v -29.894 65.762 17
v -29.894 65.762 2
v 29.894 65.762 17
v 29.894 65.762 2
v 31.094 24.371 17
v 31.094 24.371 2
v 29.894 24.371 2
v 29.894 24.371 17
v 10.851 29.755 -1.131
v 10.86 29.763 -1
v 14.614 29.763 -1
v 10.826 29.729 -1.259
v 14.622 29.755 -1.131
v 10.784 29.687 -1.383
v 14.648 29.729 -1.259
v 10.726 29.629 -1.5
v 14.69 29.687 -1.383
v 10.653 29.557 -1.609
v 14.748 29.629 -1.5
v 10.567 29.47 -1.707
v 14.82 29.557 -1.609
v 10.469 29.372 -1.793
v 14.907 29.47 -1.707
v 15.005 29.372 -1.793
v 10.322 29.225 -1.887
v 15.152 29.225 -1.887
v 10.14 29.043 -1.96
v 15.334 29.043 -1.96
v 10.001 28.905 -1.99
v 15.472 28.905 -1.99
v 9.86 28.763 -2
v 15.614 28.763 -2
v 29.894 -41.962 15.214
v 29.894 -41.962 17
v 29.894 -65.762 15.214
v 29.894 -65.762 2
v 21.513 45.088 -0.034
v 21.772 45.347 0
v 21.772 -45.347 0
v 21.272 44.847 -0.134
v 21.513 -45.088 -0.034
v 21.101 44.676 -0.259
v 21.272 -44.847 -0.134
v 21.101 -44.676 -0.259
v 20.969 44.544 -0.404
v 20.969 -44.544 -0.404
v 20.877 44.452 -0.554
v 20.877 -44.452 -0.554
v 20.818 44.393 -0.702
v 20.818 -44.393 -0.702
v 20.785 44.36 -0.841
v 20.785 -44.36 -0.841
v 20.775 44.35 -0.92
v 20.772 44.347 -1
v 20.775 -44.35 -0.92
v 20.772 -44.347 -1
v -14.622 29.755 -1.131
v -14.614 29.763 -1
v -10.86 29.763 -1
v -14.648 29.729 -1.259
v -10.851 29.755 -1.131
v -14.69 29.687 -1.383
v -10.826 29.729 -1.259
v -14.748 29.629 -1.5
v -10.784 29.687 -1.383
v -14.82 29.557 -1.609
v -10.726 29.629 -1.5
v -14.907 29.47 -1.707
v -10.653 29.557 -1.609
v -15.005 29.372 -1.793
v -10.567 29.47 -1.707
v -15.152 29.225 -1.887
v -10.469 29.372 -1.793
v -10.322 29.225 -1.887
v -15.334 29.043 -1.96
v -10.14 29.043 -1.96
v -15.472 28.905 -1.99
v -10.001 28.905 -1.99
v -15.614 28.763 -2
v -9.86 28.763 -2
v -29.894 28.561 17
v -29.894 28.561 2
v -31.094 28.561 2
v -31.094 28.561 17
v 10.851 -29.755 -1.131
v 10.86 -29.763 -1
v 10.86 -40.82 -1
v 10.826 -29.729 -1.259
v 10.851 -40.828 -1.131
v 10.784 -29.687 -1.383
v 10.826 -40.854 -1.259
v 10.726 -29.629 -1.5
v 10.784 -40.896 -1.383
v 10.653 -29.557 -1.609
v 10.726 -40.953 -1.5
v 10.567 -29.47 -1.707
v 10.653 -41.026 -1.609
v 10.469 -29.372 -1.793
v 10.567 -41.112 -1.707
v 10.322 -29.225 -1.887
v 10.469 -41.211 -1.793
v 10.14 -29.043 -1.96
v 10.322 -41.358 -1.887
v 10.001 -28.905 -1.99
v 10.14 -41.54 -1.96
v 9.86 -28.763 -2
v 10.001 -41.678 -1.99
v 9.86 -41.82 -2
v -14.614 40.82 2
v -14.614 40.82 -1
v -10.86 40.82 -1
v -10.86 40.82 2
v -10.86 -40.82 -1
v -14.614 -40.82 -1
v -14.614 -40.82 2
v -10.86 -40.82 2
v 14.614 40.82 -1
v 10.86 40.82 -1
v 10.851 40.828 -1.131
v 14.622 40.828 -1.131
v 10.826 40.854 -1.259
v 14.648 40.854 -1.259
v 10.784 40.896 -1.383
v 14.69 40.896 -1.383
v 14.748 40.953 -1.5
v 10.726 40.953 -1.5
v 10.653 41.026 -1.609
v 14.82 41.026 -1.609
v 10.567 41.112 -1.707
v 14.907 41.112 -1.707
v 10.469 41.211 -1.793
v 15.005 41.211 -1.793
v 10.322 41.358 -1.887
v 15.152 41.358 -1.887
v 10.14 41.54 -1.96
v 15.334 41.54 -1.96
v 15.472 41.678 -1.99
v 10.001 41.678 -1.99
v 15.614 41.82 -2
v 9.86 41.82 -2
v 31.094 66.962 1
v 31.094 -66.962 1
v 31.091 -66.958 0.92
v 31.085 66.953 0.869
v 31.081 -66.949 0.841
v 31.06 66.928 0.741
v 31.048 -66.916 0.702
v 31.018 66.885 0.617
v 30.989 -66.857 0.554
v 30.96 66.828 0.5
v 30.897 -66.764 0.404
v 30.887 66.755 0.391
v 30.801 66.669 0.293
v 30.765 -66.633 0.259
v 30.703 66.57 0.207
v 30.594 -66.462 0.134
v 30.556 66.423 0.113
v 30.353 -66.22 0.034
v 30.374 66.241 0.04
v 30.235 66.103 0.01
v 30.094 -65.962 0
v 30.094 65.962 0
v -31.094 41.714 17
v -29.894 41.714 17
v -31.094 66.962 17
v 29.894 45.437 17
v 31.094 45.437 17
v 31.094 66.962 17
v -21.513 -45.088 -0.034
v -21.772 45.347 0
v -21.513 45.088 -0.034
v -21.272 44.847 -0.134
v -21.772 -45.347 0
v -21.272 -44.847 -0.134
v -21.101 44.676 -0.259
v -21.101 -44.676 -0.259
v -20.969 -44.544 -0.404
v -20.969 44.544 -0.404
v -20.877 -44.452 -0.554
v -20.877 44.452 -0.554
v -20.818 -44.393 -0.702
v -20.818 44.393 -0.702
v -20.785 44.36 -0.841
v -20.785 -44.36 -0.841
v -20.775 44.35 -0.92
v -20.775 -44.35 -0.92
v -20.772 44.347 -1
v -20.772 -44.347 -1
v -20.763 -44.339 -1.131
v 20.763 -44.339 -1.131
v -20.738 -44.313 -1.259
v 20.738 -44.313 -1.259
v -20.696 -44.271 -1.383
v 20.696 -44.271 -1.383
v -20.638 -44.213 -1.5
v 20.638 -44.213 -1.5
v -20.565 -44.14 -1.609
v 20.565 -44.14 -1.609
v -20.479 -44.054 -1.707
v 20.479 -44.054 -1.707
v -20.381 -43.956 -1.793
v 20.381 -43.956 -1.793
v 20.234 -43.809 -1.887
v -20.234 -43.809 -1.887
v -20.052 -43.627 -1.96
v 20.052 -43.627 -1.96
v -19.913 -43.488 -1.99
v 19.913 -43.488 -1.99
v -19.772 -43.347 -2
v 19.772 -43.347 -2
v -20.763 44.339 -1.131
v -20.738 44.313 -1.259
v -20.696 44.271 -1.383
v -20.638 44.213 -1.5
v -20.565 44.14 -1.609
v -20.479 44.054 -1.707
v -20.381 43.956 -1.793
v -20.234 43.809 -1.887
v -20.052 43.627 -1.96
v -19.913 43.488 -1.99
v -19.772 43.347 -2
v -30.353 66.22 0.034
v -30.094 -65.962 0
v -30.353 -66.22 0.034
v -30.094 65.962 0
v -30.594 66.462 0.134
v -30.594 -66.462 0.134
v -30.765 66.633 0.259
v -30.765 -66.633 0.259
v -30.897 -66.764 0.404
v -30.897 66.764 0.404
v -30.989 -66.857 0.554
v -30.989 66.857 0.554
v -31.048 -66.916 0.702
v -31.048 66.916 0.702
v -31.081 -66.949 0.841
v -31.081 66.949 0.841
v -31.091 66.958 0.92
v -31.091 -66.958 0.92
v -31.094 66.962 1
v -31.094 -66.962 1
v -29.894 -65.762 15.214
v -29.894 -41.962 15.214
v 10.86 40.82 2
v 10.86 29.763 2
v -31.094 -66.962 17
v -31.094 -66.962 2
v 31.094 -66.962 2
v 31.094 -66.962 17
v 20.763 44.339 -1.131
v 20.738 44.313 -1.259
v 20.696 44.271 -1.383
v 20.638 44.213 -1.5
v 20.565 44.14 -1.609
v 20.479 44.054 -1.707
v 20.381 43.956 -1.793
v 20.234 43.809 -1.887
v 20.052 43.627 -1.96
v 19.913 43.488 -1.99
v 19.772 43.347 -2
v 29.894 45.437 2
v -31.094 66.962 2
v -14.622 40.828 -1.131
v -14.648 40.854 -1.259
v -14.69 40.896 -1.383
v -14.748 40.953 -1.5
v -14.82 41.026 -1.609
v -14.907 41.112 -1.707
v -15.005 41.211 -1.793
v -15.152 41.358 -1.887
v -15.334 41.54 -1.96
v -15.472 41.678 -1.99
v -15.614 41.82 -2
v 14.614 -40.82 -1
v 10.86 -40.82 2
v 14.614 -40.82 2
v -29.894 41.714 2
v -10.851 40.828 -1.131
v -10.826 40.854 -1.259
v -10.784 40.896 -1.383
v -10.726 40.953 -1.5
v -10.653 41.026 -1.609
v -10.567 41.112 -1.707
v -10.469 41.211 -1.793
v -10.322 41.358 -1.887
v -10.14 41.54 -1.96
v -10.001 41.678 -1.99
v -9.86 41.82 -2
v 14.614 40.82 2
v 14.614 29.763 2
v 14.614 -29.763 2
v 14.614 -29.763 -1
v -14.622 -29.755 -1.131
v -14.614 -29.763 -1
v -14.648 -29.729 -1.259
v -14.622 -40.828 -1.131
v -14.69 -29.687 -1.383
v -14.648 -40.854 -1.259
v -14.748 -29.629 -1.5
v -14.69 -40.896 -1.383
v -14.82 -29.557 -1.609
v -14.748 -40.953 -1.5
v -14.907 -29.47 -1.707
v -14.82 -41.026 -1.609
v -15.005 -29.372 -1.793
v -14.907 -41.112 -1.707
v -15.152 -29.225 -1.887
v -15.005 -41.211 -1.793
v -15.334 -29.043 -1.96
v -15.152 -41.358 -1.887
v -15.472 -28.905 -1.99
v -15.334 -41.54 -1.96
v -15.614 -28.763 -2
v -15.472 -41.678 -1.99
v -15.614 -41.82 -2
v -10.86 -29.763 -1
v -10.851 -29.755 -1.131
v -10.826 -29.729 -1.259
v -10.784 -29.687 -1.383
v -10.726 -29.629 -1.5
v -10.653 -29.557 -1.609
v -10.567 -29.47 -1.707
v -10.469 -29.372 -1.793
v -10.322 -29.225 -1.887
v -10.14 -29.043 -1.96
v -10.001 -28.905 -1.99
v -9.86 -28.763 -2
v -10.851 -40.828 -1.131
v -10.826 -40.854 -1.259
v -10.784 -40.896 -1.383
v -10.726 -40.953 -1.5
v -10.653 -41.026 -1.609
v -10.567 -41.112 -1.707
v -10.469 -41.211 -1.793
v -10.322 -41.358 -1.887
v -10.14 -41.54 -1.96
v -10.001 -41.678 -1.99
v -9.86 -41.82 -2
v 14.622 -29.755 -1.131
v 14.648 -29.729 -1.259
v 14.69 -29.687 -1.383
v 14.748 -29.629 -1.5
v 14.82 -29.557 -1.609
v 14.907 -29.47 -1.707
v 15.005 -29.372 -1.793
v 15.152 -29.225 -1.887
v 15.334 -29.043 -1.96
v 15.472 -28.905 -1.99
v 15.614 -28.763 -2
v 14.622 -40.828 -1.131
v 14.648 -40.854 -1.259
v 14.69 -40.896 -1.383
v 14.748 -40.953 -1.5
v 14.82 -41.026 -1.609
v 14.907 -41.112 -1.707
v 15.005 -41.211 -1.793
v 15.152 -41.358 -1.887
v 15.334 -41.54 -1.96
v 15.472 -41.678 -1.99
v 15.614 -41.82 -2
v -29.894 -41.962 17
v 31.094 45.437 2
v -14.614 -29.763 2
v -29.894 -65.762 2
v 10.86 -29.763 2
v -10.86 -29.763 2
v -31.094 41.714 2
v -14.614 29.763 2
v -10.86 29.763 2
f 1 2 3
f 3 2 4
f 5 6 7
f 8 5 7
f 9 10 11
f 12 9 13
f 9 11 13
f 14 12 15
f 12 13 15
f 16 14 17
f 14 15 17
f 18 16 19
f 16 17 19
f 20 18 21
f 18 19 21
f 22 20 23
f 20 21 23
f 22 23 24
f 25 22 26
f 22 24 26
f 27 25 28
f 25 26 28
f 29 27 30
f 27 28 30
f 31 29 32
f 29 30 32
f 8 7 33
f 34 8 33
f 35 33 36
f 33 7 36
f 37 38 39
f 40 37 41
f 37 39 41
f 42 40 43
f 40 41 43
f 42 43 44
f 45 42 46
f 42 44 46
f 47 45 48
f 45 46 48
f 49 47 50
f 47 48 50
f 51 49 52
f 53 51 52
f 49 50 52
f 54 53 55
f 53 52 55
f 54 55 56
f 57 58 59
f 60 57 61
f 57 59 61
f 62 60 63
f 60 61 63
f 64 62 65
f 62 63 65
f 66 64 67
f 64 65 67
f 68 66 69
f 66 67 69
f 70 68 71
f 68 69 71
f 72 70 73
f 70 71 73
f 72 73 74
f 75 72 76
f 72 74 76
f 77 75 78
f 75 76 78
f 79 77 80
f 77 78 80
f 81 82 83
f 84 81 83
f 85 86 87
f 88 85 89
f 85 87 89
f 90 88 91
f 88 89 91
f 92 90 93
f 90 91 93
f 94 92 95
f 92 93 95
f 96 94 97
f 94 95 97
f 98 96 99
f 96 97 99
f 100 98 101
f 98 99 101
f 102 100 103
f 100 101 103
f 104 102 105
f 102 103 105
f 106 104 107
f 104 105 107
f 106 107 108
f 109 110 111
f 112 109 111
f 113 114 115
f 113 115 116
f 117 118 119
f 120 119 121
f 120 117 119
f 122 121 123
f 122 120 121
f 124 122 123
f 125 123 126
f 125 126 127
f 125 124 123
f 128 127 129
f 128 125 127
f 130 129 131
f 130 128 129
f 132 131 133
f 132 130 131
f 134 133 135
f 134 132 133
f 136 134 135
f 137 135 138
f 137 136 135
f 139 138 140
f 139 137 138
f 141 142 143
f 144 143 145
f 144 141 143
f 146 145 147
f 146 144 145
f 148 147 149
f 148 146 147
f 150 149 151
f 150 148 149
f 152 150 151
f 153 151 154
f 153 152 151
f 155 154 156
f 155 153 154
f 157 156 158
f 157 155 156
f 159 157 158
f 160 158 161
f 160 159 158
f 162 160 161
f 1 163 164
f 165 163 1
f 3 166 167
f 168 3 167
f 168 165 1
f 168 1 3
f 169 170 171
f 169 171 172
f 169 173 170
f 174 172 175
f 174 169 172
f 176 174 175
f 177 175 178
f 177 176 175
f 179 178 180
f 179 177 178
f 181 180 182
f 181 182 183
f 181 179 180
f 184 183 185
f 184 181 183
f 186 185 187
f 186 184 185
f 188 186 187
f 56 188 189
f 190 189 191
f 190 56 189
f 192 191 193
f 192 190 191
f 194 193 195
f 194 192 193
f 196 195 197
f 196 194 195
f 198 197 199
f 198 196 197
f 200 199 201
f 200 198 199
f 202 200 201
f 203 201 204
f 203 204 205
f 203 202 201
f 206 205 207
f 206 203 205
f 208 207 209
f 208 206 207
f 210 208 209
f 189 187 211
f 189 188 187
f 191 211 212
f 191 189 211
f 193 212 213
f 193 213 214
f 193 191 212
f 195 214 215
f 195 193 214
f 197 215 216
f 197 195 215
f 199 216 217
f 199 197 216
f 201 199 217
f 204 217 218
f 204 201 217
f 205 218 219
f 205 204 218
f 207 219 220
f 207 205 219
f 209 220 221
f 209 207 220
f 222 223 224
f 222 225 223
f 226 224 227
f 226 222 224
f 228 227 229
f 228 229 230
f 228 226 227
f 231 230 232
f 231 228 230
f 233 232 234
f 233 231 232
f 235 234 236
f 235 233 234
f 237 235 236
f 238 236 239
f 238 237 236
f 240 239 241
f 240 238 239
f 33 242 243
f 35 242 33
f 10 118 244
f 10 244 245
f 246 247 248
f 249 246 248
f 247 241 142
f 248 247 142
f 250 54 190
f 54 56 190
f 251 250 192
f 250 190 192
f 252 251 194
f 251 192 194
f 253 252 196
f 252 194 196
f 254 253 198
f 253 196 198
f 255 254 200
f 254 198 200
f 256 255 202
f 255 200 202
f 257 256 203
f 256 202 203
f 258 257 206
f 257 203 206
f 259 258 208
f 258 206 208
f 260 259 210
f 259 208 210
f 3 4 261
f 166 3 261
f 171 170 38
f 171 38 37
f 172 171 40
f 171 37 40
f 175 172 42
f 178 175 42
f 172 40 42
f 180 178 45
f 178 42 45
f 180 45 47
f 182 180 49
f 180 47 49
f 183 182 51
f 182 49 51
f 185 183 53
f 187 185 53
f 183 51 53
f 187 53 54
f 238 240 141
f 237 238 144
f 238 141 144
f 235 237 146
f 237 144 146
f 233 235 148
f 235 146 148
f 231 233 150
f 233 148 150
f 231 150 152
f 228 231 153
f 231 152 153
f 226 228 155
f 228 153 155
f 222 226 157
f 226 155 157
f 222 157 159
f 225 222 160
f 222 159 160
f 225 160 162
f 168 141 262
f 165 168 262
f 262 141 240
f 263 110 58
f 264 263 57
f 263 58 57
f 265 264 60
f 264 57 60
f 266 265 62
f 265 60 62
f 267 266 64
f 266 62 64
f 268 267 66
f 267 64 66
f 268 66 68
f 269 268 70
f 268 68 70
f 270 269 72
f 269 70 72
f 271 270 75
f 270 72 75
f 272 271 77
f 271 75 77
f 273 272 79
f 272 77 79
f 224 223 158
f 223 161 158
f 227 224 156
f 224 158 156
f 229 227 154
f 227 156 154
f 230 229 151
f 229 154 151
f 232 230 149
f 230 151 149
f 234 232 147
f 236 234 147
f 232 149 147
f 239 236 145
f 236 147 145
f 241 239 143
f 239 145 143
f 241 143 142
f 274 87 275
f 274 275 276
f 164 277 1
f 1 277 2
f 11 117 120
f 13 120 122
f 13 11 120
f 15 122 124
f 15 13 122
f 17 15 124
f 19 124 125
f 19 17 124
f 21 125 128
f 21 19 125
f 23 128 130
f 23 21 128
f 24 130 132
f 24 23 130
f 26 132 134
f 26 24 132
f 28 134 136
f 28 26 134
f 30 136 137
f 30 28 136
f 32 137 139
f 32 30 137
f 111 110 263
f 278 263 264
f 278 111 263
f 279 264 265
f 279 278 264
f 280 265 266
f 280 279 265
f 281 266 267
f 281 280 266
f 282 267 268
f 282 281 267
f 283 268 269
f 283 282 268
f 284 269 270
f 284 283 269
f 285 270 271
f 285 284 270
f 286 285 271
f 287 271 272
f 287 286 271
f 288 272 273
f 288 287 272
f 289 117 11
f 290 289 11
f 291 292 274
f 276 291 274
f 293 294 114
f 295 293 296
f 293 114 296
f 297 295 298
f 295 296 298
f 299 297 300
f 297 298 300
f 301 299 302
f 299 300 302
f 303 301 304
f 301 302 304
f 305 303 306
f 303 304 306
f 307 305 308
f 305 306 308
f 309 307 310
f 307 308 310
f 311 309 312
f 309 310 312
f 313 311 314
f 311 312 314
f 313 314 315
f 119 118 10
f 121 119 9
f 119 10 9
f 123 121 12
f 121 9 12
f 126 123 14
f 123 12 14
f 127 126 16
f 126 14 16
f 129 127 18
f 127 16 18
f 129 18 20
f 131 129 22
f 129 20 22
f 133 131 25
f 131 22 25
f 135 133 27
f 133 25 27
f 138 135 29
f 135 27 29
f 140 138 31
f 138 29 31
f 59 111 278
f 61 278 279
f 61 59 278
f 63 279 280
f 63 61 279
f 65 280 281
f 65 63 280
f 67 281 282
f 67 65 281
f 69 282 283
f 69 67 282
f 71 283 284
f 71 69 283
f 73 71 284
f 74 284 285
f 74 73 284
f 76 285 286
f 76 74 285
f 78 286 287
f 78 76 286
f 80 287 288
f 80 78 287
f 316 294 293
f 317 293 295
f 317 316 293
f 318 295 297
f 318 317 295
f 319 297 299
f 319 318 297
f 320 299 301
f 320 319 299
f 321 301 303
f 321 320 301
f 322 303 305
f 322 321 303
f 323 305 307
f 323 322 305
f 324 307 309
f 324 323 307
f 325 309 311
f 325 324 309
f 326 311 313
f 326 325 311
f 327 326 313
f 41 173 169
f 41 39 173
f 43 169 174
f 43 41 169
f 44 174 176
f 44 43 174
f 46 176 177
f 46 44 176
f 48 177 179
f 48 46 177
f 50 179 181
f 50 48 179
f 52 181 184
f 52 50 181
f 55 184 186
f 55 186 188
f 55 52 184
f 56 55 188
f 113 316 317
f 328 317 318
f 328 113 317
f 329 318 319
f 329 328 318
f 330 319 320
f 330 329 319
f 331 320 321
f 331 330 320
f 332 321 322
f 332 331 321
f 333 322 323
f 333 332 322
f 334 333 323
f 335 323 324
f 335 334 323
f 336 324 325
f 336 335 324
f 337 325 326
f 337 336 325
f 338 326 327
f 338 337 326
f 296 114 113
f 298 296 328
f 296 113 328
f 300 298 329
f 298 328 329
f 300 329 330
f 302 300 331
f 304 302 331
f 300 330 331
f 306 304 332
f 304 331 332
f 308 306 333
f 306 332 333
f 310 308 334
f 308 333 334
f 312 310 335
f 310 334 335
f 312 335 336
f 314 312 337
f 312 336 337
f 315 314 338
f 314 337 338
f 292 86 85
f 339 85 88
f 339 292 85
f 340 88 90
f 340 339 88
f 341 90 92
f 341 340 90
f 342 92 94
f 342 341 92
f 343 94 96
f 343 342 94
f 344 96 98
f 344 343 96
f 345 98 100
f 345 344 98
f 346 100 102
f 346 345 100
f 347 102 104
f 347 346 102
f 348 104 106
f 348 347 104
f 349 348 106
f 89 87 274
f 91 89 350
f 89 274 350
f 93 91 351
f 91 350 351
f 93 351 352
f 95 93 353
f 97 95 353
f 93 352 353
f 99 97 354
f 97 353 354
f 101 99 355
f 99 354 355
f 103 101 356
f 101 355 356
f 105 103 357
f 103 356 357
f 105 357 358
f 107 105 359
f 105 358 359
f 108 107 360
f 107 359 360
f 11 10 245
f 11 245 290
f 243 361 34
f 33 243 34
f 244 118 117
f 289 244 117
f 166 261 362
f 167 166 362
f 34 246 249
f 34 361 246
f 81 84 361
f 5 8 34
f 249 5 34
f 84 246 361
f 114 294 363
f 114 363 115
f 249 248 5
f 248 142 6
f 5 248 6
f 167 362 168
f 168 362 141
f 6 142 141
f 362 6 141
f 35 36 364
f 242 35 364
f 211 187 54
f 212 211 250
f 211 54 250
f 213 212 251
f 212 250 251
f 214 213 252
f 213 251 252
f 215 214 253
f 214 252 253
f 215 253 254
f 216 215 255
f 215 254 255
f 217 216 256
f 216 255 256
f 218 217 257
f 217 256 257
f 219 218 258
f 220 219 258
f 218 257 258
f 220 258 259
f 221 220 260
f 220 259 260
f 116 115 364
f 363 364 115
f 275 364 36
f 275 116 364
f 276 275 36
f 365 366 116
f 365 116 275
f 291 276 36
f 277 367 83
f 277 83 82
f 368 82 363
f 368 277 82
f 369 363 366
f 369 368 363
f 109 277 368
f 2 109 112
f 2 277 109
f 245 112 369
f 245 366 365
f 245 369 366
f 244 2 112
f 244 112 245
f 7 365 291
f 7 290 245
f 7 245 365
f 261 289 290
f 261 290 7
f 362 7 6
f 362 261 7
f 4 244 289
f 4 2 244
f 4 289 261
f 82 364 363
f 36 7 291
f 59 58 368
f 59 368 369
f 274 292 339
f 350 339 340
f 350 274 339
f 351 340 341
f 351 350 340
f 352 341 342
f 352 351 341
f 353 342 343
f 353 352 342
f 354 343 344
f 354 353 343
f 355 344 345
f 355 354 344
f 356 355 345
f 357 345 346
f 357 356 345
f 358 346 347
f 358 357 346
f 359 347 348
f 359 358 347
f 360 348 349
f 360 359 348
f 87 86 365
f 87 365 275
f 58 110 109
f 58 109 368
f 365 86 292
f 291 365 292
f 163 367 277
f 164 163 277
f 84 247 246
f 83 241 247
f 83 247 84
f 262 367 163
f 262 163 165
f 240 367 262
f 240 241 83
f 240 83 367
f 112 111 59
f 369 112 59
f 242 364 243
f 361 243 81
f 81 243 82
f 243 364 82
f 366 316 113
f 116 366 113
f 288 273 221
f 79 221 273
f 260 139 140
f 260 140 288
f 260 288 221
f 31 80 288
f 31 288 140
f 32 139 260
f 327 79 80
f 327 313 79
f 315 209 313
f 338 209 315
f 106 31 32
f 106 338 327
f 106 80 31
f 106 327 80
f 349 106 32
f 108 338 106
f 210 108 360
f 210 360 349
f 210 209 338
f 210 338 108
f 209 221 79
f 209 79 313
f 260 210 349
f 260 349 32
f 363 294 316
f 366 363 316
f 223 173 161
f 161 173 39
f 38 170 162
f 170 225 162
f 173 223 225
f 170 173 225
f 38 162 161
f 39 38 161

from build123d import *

# Parameters (mm, degrees)
F0_W     = 62.1875934303
F0_H     = 133.9231580496
F1_DEPTH = 2
F3_DEPTH = 15
F4_W     = 62.1875934303
F4_H     = 1.7857002169
F5_DEPTH = 25
F6_W     = 41.5440425277
F6_H     = 88.6942744255
F7_DEPTH = 2
F8_W     = 3.7540234625
F8_H     = 11.0563002527
F9_DEPTH = 8
F10_R    = 0.99999


# Not quite as in the source:
# - a fillet or chamfer is up to 0.001 mm smaller than in the source, because OpenCascade refuses the exact size


with BuildPart() as f1:
    # F0 (on Top) → F1 (new body)
    with BuildSketch(Plane.XY):
        Rectangle(F0_W, F0_H)
    extrude(amount=F1_DEPTH)

    # F2 (on face) → F3 (join)
    with BuildSketch(Plane.XY.offset(2)):
        Polygon((29.8937967151, 45.4372726381), (31.0937967151, 45.4372726381), (31.0937967151, 66.9615790248), (-31.0937967151, 66.9615790248), (-31.0937967151, 41.7135171592), (-29.8937967151, 41.7135171592), (-29.8937967151, 65.7615790248), (29.8937967151, 65.7615790248), align=None)
        Polygon((-31.0937967151, -66.9615790248), (31.0937967151, -66.9615790248), (31.0937967151, 24.3710856885), (29.8937967151, 24.3710856885), (29.8937967151, -65.7615790248), (-29.8937967151, -65.7615790248), (-29.8937967151, 28.5614430904), (-31.0937967151, 28.5614430904), align=None)
    extrude(amount=F3_DEPTH)

    # F4 (on face) → F5 (join)
    with BuildSketch(Plane.XZ.offset(66.9615790248)):
        with Locations((0, 16.1071498916)):
            Rectangle(F4_W, F4_H)
    extrude(amount=-F5_DEPTH)

    # F6 (on face) → F7 (join)
    with BuildSketch(Plane(origin=(0, 0, 0), x_dir=(1, 0, 0), z_dir=(0, 0, -1))):
        Rectangle(F6_W, F6_H)
    extrude(amount=F7_DEPTH)

    # F8 (on face) → F9 (cut)
    with BuildSketch(Plane(origin=(0, 0, -2), x_dir=(1, 0, 0), z_dir=(0, 0, -1))):
        with Locations((12.7368234098, -35.2913737297)):
            Rectangle(F8_W, F8_H)
        with Locations((-12.7368234098, -35.2913737297)):
            Rectangle(F8_W, F8_H)
        with Locations((-12.7368234098, 35.2913737297)):
            Rectangle(F8_W, F8_H)
        with Locations((12.7368234098, 35.2913737297)):
            Rectangle(F8_W, F8_H)
    extrude(amount=-F9_DEPTH, mode=Mode.SUBTRACT)

    # F10 (radius 1 in the source; OpenCascade refuses exactly that, so slightly less here)
    f10_edges = [f1.edges().sort_by_distance(p)[0] for p in [
        (0, -44.347137, -2),
        (20.772021, 0, -2),
        (-20.772021, 0, -2),
        (0, 44.347137, -2),
        (-10.859812, 35.291374, -2),
        (-12.736823, 29.763224, -2),
        (-14.613835, 35.291374, -2),
        (-12.736823, 40.819524, -2),
        (12.736823, 29.763224, -2),
        (10.859812, 35.291374, -2),
        (12.736823, 40.819524, -2),
        (14.613835, 35.291374, -2),
        (-12.736823, -29.763224, -2),
        (-10.859812, -35.291374, -2),
        (-12.736823, -40.819524, -2),
        (-14.613835, -35.291374, -2),
        (12.736823, -29.763224, -2),
        (14.613835, -35.291374, -2),
        (12.736823, -40.819524, -2),
        (10.859812, -35.291374, -2),
        (-31.093797, 0, 0),
        (0, 66.961579, 0),
        (0, -66.961579, 0),
        (31.093797, 0, 0),
        (20.772021, 0, 0),
        (0, 44.347137, 0),
        (-20.772021, 0, 0),
        (0, -44.347137, 0),
    ]]
    fillet(f10_edges, radius=F10_R)


solid = f1.part
